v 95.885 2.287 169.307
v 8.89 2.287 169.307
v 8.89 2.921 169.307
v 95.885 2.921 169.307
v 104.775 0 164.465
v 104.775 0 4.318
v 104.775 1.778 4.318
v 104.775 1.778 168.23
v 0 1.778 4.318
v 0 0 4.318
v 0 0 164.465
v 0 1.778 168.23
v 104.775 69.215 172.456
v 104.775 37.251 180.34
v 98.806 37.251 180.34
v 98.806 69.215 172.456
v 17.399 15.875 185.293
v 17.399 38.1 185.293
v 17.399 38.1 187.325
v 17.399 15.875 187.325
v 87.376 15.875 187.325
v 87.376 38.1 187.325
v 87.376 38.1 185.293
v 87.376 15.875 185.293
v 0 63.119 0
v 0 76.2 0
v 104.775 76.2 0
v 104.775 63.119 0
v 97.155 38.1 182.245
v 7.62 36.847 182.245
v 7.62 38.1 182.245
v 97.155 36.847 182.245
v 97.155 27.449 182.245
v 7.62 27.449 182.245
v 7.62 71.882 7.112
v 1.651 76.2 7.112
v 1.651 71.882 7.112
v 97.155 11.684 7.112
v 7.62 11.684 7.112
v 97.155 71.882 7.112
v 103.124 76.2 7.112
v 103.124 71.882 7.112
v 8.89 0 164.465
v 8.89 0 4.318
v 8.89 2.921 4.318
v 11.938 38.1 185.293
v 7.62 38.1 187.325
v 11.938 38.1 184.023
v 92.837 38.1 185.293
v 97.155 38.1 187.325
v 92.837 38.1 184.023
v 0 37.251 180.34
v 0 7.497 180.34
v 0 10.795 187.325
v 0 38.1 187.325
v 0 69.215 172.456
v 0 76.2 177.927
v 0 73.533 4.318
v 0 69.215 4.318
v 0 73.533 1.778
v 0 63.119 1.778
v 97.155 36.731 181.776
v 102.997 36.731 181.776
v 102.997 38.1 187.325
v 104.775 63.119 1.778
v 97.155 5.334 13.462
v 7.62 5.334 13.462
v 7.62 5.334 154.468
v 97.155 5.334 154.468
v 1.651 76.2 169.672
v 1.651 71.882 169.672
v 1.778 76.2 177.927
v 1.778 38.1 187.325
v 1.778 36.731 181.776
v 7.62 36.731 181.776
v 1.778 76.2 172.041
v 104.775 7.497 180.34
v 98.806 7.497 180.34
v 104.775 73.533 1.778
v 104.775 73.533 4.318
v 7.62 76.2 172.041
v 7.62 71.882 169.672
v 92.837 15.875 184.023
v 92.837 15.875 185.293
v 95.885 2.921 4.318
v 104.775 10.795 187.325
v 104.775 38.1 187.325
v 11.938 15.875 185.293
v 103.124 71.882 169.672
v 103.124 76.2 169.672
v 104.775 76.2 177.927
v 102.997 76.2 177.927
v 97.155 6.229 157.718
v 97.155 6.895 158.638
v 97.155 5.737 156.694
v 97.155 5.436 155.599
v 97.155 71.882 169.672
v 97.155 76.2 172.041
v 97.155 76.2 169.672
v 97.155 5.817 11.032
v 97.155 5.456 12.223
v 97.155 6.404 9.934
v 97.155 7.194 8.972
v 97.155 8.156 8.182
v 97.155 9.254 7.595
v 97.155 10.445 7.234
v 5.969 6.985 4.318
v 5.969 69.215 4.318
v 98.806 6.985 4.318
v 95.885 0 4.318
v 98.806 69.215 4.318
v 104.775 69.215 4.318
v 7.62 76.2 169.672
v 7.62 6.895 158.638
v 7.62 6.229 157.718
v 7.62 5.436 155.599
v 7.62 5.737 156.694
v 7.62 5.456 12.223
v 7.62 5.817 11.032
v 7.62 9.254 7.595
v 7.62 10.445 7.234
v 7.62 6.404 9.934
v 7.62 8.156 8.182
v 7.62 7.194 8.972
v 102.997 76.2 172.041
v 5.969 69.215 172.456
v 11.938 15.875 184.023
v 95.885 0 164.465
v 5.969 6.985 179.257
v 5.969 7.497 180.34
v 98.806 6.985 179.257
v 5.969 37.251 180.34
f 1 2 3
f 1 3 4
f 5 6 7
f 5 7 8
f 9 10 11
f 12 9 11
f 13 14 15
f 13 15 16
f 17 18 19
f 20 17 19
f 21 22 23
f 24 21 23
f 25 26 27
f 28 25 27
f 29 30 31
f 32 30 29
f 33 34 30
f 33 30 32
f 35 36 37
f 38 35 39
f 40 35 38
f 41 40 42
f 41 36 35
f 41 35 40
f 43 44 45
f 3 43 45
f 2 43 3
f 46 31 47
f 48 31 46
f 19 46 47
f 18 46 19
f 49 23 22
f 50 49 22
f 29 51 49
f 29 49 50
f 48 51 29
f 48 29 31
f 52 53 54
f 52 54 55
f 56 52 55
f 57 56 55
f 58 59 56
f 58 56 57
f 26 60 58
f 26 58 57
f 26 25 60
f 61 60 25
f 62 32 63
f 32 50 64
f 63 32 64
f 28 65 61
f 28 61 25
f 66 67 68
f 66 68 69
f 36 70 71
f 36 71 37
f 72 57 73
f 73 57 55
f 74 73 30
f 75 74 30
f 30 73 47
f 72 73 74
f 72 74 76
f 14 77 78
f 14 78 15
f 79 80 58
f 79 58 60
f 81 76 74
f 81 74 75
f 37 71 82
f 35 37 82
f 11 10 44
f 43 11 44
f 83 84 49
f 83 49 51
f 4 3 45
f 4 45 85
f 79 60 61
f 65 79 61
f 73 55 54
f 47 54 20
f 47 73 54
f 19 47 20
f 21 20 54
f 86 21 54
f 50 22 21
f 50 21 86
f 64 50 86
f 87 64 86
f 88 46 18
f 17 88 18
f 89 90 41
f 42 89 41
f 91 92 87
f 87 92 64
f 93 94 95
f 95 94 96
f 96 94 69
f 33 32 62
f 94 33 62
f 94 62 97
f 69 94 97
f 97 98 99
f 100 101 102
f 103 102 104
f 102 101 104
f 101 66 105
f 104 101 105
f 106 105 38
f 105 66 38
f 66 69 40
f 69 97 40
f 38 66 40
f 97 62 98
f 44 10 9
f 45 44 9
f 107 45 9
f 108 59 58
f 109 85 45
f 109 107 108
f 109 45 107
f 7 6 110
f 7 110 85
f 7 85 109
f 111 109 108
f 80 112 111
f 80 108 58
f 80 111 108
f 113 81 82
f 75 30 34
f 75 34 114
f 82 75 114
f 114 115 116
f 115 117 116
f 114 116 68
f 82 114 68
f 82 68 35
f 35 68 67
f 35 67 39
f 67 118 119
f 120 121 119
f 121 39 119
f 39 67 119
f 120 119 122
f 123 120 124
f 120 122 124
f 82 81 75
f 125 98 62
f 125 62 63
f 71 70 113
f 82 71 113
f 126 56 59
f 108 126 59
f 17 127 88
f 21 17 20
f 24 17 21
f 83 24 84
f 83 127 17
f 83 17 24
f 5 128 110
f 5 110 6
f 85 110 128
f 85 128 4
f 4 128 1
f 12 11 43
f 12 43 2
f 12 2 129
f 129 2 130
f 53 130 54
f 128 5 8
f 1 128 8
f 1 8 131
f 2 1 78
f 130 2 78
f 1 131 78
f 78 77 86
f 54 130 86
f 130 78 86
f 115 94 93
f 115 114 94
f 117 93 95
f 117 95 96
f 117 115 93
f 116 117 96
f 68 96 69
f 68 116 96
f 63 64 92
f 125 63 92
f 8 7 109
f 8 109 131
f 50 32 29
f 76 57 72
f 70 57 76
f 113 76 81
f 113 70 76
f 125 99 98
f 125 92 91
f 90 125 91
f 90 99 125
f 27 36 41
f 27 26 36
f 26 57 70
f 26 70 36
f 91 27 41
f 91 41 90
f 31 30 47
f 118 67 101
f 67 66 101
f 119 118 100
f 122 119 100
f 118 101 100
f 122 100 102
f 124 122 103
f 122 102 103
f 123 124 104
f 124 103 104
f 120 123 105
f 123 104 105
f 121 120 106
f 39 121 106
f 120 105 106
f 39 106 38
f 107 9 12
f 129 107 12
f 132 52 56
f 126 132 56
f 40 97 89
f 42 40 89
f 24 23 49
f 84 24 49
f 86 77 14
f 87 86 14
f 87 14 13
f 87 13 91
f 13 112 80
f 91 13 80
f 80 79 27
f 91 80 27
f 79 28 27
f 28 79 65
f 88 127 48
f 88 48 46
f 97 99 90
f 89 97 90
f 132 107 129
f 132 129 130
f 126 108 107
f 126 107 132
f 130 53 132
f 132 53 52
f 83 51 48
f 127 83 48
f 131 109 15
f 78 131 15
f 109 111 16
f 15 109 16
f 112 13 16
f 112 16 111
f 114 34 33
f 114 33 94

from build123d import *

# Parameters (mm, degrees)
SKETCH1_W                       = 104.775
SKETCH1_H                       = 76.2
BOSS_EXTRUDE1_DEPTH             = 187.325
CUT_EXTRUDE1_REACH              = 106.775
SKETCH3_W                       = 101.473
SKETCH3_H                       = 162.56
CUT_EXTRUDE2_DEPTH              = 4.318
SKETCH4_W                       = 89.535
SKETCH4_H                       = 175.133
CUT_EXTRUDE3_DEPTH              = 66.548
CUT_EXTRUDE3_DIRECTION_2_REACH  = 6.318
SKETCH5_W                       = 89.535
SKETCH5_H                       = 15.113
CUT_EXTRUDE4_DEPTH              = 38.1
CUT_EXTRUDE5_DEPTH              = 105.775
SKETCH7_W                       = 5.842
SKETCH7_H                       = 43.18
CUT_EXTRUDE6_DEPTH              = 5.715
CUT_EXTRUDE7_DEPTH              = 22.225
BOSS_EXTRUDE2_REACH             = 54.388
BOSS_EXTRUDE2_DIRECTION_2_REACH = 54.387
CUT_EXTRUDE8_DEPTH              = 104.775
CUT_EXTRUDE9_DEPTH              = 5.969
SKETCH12_W                      = 86.995
SKETCH12_H                      = 164.98932792
CUT_EXTRUDE10_DEPTH             = 2.921
CUT_EXTRUDE11_DEPTH             = 184.007
FILLET1_R                       = 6.35


with BuildPart() as part:
    # Sketch1 → Boss-Extrude1 (new body)
    with BuildSketch(Plane.XY):
        with Locations((52.3875, 38.1)):
            Rectangle(SKETCH1_W, SKETCH1_H)
    extrude(amount=BOSS_EXTRUDE1_DEPTH)

    # Sketch2 → Cut-Extrude1 (cut, up to next)
    with BuildSketch(Plane(origin=(104.775, 0, 0), x_dir=(0, 0, -1), z_dir=(1, 0, 0)), mode=Mode.PRIVATE) as cut_extrude1_sk1:
        Polygon((0, 0), (-4.318, 0), (-4.318, 73.533), (-1.778, 73.533), (-1.778, 63.119), (0, 63.119), align=None)
    cut_extrude1_tool1 = extrude(cut_extrude1_sk1.sketch, amount=-CUT_EXTRUDE1_REACH, mode=Mode.PRIVATE) & part.part
    add(cut_extrude1_tool1.solids().sort_by_distance((104.775, 34.812119, 2.237647))[0], mode=Mode.SUBTRACT)

    # Sketch3 → Cut-Extrude2 (cut)
    with BuildSketch(Plane(origin=(0, 76.2, 0), x_dir=(1, 0, 0), z_dir=(0, 1, 0))):
        with Locations((52.3875, -88.392)):
            Rectangle(SKETCH3_W, SKETCH3_H)
    extrude(amount=-CUT_EXTRUDE2_DEPTH, mode=Mode.SUBTRACT)

    # Sketch4 → Cut-Extrude3 (cut)
    with BuildSketch(Plane(origin=(0, 71.882, 0), x_dir=(1, 0, 0), z_dir=(0, 1, 0))):
        with Locations((52.3875, -94.6785)):
            Rectangle(SKETCH4_W, SKETCH4_H)
    extrude(amount=-CUT_EXTRUDE3_DEPTH, mode=Mode.SUBTRACT)

    # Sketch4 → Cut-Extrude3 direction 2 (cut, up to next)
    with BuildSketch(Plane(origin=(0, 71.882, 0), x_dir=(1, 0, 0), z_dir=(0, 1, 0)), mode=Mode.PRIVATE) as cut_extrude3_direction_2_sk1:
        with Locations((52.3875, -94.6785)):
            Rectangle(SKETCH4_W, SKETCH4_H)
    cut_extrude3_direction_2_tool1 = extrude(cut_extrude3_direction_2_sk1.sketch, amount=CUT_EXTRUDE3_DIRECTION_2_REACH, mode=Mode.PRIVATE) & part.part
    add(cut_extrude3_direction_2_tool1.solids().sort_by_distance((52.3875, 71.882, 94.6785))[0], mode=Mode.SUBTRACT)

    # Sketch5 → Cut-Extrude4 (cut)
    with BuildSketch(Plane(origin=(0, 76.2, 0), x_dir=(1, 0, 0), z_dir=(0, 1, 0))):
        with Locations((52.3875, -179.7685)):
            Rectangle(SKETCH5_W, SKETCH5_H)
    extrude(amount=-CUT_EXTRUDE4_DEPTH, mode=Mode.SUBTRACT)

    # Sketch6 → Cut-Extrude5 (cut, through all)
    with BuildSketch(Plane.ZY):
        Polygon((187.325, 38.1), (187.325, 76.2), (177.927, 76.2), align=None)
    extrude(amount=-CUT_EXTRUDE5_DEPTH, mode=Mode.SUBTRACT)

    # Sketch7 → Cut-Extrude6 (cut)
    with BuildSketch(Plane(origin=(0, 45.741868113, 185.440005865), x_dir=(1, 0, 0), z_dir=(0, 0.239488471, 0.970899208))):
        with Locations((4.699, 13.719081937)):
            Rectangle(SKETCH7_W, SKETCH7_H)
        with Locations((100.076, 13.719081937)):
            Rectangle(SKETCH7_W, SKETCH7_H)
    extrude(amount=-CUT_EXTRUDE6_DEPTH, mode=Mode.SUBTRACT)

    # Sketch8 → Cut-Extrude7 (cut)
    with BuildSketch(Plane(origin=(0, 38.1, 0), x_dir=(1, 0, 0), z_dir=(0, 1, 0))):
        Polygon((92.837, -184.023), (11.938, -184.023), (11.938, -185.293), (17.399, -185.293), (17.399, -187.325), (87.376, -187.325), (87.376, -185.293), (92.837, -185.293), align=None)
    extrude(amount=-CUT_EXTRUDE7_DEPTH, mode=Mode.SUBTRACT)

    # Boss-Extrude2: up to this face of the body (flat: up to its plane)
    boss_extrude2_end = Plane(part.part.faces().sort_by_distance((97.155, 38.338270724, 93.520892383))[0])
    # Sketch9 → Boss-Extrude2 (add, up to the picked face)
    with BuildSketch(Plane(origin=(52.3875, 0, 0), x_dir=(0, 0, -1), z_dir=(1, 0, 0)), mode=Mode.PRIVATE) as boss_extrude2_sk1:
        Polygon((-156.845, 5.334), (-182.245, 5.334), (-182.245, 27.448933333), align=None)
    boss_extrude2_tool1 = split(extrude(boss_extrude2_sk1.sketch, amount=BOSS_EXTRUDE2_REACH, mode=Mode.PRIVATE), bisect_by=boss_extrude2_end, keep=Keep.BOTH, mode=Mode.PRIVATE)
    add(boss_extrude2_tool1.solids().sort_by_distance((52.3875, 12.705644, 173.778333))[0])

    # Boss-Extrude2 direction 2: up to this face of the body (flat: up to its plane)
    boss_extrude2_direction_2_end = Plane(part.part.faces().sort_by_distance((7.62, 38.338270724, 93.520892383))[0])
    # Sketch9 → Boss-Extrude2 direction 2 (add, up to the picked face)
    with BuildSketch(Plane(origin=(52.3875, 0, 0), x_dir=(0, 0, -1), z_dir=(1, 0, 0)), mode=Mode.PRIVATE) as boss_extrude2_direction_2_sk1:
        Polygon((-156.845, 5.334), (-182.245, 5.334), (-182.245, 27.448933333), align=None)
    boss_extrude2_direction_2_tool1 = split(extrude(boss_extrude2_direction_2_sk1.sketch, amount=-BOSS_EXTRUDE2_DIRECTION_2_REACH, mode=Mode.PRIVATE), bisect_by=boss_extrude2_direction_2_end, keep=Keep.BOTH, mode=Mode.PRIVATE)
    add(boss_extrude2_direction_2_tool1.solids().sort_by_distance((52.3875, 12.705644, 173.778333))[0])

    # Sketch10 → Cut-Extrude8 (cut)
    with BuildSketch(Plane(origin=(104.775, 0, 0), x_dir=(0, 0, -1), z_dir=(1, 0, 0))):
        Polygon((-187.325, 10.795), (-187.325, 0), (-164.465, 0), align=None)
    extrude(amount=-CUT_EXTRUDE8_DEPTH, mode=Mode.SUBTRACT)

    # Sketch11 → Cut-Extrude9 (cut)
    with BuildSketch(Plane.ZY):
        Polygon((110.611802523, 69.215), (4.318, 69.215), (4.318, 6.985), (180.34, 6.985), (180.34, 37.251236671), (172.455605046, 69.215), align=None)
    cut_extrude9 = extrude(amount=-CUT_EXTRUDE9_DEPTH, mode=Mode.SUBTRACT)

    # Mirror1: Cut-Extrude9 across plane
    add(cut_extrude9.mirror(Plane(origin=(52.3875, 0, 0), x_dir=(0, 0, 1), z_dir=(1, 0, 0))), mode=Mode.SUBTRACT)

    # Sketch12 → Cut-Extrude10 (cut)
    with BuildSketch(Plane.XZ):
        with Locations((52.3875, 86.81266396)):
            Rectangle(SKETCH12_W, SKETCH12_H)
    extrude(amount=-CUT_EXTRUDE10_DEPTH, mode=Mode.SUBTRACT)

    # Sketch13 → Cut-Extrude11 (cut, through all)
    with BuildSketch(Plane(origin=(0, 0, 4.318), x_dir=(-1, 0, 0), z_dir=(0, 0, -1))):
        Polygon((-5.969, 6.985), (0, 6.985), (0, 1.778), align=None)
        Polygon((-98.806, 6.985), (-104.775, 6.985), (-104.775, 1.778), align=None)
    extrude(amount=-CUT_EXTRUDE11_DEPTH, mode=Mode.SUBTRACT)

    # Fillet1
    fillet1_edges = [part.edges().sort_by_distance(p)[0] for p in [
        (52.3875, 5.334, 7.112),
        (52.3875, 5.334, 156.845),
    ]]
    fillet(fillet1_edges, radius=FILLET1_R)


solid = part.part
